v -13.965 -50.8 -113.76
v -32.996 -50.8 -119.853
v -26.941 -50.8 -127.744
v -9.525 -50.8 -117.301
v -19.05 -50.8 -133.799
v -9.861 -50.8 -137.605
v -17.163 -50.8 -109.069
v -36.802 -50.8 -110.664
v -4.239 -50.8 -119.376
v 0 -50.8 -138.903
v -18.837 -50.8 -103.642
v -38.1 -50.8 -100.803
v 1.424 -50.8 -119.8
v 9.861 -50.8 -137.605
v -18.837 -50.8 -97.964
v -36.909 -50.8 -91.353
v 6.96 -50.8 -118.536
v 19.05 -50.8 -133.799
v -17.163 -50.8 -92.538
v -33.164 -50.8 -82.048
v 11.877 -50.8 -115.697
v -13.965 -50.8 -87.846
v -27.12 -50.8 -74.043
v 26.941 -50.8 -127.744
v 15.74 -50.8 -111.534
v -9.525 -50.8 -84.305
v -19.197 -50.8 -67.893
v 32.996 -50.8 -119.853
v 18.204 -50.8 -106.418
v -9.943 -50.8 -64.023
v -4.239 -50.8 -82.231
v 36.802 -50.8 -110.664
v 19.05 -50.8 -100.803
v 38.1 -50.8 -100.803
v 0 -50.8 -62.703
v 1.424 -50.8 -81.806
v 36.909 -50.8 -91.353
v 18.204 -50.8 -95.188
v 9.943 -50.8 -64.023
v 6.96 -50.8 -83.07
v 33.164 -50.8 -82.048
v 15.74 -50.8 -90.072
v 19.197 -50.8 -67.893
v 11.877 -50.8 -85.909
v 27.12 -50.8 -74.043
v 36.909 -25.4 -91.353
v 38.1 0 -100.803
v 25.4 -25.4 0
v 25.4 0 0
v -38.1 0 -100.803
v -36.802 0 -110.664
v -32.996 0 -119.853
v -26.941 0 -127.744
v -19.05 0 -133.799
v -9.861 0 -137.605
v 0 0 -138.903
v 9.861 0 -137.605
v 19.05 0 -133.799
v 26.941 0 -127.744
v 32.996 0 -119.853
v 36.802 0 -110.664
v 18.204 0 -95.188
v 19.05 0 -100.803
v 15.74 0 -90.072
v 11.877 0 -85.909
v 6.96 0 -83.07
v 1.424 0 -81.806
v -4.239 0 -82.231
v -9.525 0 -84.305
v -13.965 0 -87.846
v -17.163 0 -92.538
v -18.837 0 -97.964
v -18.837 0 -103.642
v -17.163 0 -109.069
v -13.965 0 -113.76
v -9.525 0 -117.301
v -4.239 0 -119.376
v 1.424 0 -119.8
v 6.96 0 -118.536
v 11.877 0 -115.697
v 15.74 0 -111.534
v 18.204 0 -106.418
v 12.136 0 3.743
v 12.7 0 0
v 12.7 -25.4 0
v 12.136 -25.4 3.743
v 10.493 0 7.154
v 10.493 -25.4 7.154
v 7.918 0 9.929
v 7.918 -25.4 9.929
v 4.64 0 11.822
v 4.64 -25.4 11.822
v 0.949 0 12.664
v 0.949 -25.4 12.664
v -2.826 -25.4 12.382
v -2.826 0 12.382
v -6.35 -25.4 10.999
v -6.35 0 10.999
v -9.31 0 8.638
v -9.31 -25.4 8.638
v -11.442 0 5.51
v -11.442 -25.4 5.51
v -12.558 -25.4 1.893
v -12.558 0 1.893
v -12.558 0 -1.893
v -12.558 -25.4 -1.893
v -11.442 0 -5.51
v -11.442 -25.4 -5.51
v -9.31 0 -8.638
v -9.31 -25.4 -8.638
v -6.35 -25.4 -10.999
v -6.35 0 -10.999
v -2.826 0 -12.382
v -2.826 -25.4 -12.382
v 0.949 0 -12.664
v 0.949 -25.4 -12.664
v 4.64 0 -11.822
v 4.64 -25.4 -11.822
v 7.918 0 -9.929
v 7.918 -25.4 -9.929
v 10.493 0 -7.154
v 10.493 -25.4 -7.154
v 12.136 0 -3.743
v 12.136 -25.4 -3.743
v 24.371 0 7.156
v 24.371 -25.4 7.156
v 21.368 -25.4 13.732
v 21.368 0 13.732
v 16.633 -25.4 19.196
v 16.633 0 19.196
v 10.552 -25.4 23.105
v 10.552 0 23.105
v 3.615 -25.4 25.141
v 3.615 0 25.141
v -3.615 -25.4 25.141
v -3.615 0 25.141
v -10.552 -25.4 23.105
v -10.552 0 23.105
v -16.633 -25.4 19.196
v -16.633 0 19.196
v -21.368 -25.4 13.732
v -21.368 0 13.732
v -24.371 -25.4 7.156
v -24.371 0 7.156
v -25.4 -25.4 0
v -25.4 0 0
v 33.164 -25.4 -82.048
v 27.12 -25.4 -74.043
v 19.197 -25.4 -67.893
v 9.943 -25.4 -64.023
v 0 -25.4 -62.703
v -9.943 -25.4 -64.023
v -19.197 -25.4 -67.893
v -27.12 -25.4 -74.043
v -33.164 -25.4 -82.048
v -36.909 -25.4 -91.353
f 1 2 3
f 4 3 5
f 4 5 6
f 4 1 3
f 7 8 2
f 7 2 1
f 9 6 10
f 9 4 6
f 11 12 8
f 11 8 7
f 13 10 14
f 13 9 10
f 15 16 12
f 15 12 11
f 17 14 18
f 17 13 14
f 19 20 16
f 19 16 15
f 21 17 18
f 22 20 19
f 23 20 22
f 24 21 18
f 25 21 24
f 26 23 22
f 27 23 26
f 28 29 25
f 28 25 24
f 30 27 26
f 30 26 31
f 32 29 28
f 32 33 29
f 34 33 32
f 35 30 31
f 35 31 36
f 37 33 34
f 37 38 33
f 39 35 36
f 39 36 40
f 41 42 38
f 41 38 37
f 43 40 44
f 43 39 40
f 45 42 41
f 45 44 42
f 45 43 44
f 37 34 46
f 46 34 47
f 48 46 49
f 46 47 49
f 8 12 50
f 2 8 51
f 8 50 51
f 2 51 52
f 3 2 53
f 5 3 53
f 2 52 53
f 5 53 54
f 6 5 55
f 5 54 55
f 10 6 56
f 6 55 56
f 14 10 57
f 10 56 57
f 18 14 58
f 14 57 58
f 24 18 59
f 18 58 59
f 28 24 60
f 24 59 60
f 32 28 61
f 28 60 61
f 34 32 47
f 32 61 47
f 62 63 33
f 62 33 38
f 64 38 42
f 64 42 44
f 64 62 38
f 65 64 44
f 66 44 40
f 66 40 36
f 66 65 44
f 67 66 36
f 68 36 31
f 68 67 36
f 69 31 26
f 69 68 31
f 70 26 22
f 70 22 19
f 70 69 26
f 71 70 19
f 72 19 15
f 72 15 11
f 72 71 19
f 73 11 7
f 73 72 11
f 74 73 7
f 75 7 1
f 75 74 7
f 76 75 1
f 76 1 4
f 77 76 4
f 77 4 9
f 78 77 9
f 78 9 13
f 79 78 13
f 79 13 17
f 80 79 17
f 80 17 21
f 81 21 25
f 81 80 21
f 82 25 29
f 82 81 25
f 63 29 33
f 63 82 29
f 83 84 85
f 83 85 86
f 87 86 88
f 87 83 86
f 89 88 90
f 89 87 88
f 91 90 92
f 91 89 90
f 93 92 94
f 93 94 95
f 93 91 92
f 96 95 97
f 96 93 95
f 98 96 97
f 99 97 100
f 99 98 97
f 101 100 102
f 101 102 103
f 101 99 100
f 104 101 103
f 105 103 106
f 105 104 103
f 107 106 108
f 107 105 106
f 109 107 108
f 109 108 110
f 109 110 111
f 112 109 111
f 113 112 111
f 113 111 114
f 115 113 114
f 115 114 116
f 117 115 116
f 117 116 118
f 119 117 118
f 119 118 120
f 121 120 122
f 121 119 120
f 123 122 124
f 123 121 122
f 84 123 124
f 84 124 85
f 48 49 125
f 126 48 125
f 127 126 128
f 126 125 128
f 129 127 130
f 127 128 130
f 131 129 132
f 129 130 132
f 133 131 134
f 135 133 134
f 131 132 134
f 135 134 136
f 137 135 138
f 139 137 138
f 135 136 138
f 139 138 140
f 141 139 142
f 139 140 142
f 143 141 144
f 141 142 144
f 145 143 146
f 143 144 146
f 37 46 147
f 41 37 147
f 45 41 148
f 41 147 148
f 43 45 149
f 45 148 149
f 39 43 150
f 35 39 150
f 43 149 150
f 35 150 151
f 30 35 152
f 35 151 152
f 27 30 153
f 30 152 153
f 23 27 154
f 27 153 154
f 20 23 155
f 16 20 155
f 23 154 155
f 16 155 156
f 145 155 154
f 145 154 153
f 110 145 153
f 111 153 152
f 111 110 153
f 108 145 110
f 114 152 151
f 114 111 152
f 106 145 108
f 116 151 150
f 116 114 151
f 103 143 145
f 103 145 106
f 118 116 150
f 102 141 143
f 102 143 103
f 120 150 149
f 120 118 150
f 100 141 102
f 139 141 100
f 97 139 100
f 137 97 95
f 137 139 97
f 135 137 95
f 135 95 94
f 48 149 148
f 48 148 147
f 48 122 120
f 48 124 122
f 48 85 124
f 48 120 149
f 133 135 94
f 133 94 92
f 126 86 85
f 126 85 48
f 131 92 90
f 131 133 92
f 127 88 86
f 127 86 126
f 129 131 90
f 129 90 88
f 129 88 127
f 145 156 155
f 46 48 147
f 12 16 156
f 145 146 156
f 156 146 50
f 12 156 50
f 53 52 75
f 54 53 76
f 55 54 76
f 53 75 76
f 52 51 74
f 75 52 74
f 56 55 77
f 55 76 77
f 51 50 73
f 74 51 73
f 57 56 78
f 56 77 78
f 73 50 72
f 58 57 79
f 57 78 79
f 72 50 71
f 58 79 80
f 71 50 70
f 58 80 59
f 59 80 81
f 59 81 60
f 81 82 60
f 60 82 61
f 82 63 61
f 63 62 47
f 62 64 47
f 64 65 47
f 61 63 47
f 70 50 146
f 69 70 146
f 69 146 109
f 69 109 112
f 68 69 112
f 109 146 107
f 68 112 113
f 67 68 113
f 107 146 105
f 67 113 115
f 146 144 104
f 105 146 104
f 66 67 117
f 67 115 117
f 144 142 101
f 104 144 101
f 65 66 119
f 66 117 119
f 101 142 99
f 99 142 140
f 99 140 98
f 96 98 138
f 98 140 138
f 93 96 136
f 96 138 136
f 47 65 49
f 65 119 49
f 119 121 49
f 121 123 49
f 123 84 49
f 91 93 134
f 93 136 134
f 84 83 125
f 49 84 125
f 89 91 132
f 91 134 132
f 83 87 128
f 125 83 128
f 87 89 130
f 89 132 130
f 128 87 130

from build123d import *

# Parameters (mm, degrees)
F0_R     = 12.7
F1_DEPTH = 25.4
F0_R_2   = 19.05
F2_DEPTH = 50.8


with BuildPart() as f1:
    # F0 (on Front) → F1 (new body)
    with BuildSketch(Plane.XZ):
        with BuildLine():
            ThreePointArc((-25.4, 0), (0, -25.4), (25.4, 0))
            ThreePointArc((25.4, 0), (0, 25.4), (-25.4, 0))
        make_face()
        Circle(F0_R, mode=Mode.SUBTRACT)
        with BuildLine():
            Line((36.909375, -91.3528319874), (25.4, 0))
            ThreePointArc((25.4, 0), (0, -25.4), (-25.4, 0))
            Line((-25.4, 0), (-36.909375, -91.3528319874))
            ThreePointArc((-36.909375, -91.3528319874), (0, -62.7031249516), (36.909375, -91.3528319874))
        make_face()
    extrude(amount=F1_DEPTH)

    # F0 (on Front) → F2 (join)
    with BuildSketch(Plane.XZ):
        with BuildLine():
            Line((38.1, -100.8031249516), (36.909375, -91.3528319874))
            ThreePointArc((36.909375, -91.3528319874), (0, -62.7031249516), (-36.909375, -91.3528319874))
            Line((-36.909375, -91.3528319874), (-38.1, -100.8031249516))
            ThreePointArc((-38.1, -100.8031249516), (0, -138.9031249516), (38.1, -100.8031249516))
        make_face()
        with Locations((0, -100.8031249516)):
            Circle(F0_R_2, mode=Mode.SUBTRACT)
    extrude(amount=F2_DEPTH)


solid = f1.part
